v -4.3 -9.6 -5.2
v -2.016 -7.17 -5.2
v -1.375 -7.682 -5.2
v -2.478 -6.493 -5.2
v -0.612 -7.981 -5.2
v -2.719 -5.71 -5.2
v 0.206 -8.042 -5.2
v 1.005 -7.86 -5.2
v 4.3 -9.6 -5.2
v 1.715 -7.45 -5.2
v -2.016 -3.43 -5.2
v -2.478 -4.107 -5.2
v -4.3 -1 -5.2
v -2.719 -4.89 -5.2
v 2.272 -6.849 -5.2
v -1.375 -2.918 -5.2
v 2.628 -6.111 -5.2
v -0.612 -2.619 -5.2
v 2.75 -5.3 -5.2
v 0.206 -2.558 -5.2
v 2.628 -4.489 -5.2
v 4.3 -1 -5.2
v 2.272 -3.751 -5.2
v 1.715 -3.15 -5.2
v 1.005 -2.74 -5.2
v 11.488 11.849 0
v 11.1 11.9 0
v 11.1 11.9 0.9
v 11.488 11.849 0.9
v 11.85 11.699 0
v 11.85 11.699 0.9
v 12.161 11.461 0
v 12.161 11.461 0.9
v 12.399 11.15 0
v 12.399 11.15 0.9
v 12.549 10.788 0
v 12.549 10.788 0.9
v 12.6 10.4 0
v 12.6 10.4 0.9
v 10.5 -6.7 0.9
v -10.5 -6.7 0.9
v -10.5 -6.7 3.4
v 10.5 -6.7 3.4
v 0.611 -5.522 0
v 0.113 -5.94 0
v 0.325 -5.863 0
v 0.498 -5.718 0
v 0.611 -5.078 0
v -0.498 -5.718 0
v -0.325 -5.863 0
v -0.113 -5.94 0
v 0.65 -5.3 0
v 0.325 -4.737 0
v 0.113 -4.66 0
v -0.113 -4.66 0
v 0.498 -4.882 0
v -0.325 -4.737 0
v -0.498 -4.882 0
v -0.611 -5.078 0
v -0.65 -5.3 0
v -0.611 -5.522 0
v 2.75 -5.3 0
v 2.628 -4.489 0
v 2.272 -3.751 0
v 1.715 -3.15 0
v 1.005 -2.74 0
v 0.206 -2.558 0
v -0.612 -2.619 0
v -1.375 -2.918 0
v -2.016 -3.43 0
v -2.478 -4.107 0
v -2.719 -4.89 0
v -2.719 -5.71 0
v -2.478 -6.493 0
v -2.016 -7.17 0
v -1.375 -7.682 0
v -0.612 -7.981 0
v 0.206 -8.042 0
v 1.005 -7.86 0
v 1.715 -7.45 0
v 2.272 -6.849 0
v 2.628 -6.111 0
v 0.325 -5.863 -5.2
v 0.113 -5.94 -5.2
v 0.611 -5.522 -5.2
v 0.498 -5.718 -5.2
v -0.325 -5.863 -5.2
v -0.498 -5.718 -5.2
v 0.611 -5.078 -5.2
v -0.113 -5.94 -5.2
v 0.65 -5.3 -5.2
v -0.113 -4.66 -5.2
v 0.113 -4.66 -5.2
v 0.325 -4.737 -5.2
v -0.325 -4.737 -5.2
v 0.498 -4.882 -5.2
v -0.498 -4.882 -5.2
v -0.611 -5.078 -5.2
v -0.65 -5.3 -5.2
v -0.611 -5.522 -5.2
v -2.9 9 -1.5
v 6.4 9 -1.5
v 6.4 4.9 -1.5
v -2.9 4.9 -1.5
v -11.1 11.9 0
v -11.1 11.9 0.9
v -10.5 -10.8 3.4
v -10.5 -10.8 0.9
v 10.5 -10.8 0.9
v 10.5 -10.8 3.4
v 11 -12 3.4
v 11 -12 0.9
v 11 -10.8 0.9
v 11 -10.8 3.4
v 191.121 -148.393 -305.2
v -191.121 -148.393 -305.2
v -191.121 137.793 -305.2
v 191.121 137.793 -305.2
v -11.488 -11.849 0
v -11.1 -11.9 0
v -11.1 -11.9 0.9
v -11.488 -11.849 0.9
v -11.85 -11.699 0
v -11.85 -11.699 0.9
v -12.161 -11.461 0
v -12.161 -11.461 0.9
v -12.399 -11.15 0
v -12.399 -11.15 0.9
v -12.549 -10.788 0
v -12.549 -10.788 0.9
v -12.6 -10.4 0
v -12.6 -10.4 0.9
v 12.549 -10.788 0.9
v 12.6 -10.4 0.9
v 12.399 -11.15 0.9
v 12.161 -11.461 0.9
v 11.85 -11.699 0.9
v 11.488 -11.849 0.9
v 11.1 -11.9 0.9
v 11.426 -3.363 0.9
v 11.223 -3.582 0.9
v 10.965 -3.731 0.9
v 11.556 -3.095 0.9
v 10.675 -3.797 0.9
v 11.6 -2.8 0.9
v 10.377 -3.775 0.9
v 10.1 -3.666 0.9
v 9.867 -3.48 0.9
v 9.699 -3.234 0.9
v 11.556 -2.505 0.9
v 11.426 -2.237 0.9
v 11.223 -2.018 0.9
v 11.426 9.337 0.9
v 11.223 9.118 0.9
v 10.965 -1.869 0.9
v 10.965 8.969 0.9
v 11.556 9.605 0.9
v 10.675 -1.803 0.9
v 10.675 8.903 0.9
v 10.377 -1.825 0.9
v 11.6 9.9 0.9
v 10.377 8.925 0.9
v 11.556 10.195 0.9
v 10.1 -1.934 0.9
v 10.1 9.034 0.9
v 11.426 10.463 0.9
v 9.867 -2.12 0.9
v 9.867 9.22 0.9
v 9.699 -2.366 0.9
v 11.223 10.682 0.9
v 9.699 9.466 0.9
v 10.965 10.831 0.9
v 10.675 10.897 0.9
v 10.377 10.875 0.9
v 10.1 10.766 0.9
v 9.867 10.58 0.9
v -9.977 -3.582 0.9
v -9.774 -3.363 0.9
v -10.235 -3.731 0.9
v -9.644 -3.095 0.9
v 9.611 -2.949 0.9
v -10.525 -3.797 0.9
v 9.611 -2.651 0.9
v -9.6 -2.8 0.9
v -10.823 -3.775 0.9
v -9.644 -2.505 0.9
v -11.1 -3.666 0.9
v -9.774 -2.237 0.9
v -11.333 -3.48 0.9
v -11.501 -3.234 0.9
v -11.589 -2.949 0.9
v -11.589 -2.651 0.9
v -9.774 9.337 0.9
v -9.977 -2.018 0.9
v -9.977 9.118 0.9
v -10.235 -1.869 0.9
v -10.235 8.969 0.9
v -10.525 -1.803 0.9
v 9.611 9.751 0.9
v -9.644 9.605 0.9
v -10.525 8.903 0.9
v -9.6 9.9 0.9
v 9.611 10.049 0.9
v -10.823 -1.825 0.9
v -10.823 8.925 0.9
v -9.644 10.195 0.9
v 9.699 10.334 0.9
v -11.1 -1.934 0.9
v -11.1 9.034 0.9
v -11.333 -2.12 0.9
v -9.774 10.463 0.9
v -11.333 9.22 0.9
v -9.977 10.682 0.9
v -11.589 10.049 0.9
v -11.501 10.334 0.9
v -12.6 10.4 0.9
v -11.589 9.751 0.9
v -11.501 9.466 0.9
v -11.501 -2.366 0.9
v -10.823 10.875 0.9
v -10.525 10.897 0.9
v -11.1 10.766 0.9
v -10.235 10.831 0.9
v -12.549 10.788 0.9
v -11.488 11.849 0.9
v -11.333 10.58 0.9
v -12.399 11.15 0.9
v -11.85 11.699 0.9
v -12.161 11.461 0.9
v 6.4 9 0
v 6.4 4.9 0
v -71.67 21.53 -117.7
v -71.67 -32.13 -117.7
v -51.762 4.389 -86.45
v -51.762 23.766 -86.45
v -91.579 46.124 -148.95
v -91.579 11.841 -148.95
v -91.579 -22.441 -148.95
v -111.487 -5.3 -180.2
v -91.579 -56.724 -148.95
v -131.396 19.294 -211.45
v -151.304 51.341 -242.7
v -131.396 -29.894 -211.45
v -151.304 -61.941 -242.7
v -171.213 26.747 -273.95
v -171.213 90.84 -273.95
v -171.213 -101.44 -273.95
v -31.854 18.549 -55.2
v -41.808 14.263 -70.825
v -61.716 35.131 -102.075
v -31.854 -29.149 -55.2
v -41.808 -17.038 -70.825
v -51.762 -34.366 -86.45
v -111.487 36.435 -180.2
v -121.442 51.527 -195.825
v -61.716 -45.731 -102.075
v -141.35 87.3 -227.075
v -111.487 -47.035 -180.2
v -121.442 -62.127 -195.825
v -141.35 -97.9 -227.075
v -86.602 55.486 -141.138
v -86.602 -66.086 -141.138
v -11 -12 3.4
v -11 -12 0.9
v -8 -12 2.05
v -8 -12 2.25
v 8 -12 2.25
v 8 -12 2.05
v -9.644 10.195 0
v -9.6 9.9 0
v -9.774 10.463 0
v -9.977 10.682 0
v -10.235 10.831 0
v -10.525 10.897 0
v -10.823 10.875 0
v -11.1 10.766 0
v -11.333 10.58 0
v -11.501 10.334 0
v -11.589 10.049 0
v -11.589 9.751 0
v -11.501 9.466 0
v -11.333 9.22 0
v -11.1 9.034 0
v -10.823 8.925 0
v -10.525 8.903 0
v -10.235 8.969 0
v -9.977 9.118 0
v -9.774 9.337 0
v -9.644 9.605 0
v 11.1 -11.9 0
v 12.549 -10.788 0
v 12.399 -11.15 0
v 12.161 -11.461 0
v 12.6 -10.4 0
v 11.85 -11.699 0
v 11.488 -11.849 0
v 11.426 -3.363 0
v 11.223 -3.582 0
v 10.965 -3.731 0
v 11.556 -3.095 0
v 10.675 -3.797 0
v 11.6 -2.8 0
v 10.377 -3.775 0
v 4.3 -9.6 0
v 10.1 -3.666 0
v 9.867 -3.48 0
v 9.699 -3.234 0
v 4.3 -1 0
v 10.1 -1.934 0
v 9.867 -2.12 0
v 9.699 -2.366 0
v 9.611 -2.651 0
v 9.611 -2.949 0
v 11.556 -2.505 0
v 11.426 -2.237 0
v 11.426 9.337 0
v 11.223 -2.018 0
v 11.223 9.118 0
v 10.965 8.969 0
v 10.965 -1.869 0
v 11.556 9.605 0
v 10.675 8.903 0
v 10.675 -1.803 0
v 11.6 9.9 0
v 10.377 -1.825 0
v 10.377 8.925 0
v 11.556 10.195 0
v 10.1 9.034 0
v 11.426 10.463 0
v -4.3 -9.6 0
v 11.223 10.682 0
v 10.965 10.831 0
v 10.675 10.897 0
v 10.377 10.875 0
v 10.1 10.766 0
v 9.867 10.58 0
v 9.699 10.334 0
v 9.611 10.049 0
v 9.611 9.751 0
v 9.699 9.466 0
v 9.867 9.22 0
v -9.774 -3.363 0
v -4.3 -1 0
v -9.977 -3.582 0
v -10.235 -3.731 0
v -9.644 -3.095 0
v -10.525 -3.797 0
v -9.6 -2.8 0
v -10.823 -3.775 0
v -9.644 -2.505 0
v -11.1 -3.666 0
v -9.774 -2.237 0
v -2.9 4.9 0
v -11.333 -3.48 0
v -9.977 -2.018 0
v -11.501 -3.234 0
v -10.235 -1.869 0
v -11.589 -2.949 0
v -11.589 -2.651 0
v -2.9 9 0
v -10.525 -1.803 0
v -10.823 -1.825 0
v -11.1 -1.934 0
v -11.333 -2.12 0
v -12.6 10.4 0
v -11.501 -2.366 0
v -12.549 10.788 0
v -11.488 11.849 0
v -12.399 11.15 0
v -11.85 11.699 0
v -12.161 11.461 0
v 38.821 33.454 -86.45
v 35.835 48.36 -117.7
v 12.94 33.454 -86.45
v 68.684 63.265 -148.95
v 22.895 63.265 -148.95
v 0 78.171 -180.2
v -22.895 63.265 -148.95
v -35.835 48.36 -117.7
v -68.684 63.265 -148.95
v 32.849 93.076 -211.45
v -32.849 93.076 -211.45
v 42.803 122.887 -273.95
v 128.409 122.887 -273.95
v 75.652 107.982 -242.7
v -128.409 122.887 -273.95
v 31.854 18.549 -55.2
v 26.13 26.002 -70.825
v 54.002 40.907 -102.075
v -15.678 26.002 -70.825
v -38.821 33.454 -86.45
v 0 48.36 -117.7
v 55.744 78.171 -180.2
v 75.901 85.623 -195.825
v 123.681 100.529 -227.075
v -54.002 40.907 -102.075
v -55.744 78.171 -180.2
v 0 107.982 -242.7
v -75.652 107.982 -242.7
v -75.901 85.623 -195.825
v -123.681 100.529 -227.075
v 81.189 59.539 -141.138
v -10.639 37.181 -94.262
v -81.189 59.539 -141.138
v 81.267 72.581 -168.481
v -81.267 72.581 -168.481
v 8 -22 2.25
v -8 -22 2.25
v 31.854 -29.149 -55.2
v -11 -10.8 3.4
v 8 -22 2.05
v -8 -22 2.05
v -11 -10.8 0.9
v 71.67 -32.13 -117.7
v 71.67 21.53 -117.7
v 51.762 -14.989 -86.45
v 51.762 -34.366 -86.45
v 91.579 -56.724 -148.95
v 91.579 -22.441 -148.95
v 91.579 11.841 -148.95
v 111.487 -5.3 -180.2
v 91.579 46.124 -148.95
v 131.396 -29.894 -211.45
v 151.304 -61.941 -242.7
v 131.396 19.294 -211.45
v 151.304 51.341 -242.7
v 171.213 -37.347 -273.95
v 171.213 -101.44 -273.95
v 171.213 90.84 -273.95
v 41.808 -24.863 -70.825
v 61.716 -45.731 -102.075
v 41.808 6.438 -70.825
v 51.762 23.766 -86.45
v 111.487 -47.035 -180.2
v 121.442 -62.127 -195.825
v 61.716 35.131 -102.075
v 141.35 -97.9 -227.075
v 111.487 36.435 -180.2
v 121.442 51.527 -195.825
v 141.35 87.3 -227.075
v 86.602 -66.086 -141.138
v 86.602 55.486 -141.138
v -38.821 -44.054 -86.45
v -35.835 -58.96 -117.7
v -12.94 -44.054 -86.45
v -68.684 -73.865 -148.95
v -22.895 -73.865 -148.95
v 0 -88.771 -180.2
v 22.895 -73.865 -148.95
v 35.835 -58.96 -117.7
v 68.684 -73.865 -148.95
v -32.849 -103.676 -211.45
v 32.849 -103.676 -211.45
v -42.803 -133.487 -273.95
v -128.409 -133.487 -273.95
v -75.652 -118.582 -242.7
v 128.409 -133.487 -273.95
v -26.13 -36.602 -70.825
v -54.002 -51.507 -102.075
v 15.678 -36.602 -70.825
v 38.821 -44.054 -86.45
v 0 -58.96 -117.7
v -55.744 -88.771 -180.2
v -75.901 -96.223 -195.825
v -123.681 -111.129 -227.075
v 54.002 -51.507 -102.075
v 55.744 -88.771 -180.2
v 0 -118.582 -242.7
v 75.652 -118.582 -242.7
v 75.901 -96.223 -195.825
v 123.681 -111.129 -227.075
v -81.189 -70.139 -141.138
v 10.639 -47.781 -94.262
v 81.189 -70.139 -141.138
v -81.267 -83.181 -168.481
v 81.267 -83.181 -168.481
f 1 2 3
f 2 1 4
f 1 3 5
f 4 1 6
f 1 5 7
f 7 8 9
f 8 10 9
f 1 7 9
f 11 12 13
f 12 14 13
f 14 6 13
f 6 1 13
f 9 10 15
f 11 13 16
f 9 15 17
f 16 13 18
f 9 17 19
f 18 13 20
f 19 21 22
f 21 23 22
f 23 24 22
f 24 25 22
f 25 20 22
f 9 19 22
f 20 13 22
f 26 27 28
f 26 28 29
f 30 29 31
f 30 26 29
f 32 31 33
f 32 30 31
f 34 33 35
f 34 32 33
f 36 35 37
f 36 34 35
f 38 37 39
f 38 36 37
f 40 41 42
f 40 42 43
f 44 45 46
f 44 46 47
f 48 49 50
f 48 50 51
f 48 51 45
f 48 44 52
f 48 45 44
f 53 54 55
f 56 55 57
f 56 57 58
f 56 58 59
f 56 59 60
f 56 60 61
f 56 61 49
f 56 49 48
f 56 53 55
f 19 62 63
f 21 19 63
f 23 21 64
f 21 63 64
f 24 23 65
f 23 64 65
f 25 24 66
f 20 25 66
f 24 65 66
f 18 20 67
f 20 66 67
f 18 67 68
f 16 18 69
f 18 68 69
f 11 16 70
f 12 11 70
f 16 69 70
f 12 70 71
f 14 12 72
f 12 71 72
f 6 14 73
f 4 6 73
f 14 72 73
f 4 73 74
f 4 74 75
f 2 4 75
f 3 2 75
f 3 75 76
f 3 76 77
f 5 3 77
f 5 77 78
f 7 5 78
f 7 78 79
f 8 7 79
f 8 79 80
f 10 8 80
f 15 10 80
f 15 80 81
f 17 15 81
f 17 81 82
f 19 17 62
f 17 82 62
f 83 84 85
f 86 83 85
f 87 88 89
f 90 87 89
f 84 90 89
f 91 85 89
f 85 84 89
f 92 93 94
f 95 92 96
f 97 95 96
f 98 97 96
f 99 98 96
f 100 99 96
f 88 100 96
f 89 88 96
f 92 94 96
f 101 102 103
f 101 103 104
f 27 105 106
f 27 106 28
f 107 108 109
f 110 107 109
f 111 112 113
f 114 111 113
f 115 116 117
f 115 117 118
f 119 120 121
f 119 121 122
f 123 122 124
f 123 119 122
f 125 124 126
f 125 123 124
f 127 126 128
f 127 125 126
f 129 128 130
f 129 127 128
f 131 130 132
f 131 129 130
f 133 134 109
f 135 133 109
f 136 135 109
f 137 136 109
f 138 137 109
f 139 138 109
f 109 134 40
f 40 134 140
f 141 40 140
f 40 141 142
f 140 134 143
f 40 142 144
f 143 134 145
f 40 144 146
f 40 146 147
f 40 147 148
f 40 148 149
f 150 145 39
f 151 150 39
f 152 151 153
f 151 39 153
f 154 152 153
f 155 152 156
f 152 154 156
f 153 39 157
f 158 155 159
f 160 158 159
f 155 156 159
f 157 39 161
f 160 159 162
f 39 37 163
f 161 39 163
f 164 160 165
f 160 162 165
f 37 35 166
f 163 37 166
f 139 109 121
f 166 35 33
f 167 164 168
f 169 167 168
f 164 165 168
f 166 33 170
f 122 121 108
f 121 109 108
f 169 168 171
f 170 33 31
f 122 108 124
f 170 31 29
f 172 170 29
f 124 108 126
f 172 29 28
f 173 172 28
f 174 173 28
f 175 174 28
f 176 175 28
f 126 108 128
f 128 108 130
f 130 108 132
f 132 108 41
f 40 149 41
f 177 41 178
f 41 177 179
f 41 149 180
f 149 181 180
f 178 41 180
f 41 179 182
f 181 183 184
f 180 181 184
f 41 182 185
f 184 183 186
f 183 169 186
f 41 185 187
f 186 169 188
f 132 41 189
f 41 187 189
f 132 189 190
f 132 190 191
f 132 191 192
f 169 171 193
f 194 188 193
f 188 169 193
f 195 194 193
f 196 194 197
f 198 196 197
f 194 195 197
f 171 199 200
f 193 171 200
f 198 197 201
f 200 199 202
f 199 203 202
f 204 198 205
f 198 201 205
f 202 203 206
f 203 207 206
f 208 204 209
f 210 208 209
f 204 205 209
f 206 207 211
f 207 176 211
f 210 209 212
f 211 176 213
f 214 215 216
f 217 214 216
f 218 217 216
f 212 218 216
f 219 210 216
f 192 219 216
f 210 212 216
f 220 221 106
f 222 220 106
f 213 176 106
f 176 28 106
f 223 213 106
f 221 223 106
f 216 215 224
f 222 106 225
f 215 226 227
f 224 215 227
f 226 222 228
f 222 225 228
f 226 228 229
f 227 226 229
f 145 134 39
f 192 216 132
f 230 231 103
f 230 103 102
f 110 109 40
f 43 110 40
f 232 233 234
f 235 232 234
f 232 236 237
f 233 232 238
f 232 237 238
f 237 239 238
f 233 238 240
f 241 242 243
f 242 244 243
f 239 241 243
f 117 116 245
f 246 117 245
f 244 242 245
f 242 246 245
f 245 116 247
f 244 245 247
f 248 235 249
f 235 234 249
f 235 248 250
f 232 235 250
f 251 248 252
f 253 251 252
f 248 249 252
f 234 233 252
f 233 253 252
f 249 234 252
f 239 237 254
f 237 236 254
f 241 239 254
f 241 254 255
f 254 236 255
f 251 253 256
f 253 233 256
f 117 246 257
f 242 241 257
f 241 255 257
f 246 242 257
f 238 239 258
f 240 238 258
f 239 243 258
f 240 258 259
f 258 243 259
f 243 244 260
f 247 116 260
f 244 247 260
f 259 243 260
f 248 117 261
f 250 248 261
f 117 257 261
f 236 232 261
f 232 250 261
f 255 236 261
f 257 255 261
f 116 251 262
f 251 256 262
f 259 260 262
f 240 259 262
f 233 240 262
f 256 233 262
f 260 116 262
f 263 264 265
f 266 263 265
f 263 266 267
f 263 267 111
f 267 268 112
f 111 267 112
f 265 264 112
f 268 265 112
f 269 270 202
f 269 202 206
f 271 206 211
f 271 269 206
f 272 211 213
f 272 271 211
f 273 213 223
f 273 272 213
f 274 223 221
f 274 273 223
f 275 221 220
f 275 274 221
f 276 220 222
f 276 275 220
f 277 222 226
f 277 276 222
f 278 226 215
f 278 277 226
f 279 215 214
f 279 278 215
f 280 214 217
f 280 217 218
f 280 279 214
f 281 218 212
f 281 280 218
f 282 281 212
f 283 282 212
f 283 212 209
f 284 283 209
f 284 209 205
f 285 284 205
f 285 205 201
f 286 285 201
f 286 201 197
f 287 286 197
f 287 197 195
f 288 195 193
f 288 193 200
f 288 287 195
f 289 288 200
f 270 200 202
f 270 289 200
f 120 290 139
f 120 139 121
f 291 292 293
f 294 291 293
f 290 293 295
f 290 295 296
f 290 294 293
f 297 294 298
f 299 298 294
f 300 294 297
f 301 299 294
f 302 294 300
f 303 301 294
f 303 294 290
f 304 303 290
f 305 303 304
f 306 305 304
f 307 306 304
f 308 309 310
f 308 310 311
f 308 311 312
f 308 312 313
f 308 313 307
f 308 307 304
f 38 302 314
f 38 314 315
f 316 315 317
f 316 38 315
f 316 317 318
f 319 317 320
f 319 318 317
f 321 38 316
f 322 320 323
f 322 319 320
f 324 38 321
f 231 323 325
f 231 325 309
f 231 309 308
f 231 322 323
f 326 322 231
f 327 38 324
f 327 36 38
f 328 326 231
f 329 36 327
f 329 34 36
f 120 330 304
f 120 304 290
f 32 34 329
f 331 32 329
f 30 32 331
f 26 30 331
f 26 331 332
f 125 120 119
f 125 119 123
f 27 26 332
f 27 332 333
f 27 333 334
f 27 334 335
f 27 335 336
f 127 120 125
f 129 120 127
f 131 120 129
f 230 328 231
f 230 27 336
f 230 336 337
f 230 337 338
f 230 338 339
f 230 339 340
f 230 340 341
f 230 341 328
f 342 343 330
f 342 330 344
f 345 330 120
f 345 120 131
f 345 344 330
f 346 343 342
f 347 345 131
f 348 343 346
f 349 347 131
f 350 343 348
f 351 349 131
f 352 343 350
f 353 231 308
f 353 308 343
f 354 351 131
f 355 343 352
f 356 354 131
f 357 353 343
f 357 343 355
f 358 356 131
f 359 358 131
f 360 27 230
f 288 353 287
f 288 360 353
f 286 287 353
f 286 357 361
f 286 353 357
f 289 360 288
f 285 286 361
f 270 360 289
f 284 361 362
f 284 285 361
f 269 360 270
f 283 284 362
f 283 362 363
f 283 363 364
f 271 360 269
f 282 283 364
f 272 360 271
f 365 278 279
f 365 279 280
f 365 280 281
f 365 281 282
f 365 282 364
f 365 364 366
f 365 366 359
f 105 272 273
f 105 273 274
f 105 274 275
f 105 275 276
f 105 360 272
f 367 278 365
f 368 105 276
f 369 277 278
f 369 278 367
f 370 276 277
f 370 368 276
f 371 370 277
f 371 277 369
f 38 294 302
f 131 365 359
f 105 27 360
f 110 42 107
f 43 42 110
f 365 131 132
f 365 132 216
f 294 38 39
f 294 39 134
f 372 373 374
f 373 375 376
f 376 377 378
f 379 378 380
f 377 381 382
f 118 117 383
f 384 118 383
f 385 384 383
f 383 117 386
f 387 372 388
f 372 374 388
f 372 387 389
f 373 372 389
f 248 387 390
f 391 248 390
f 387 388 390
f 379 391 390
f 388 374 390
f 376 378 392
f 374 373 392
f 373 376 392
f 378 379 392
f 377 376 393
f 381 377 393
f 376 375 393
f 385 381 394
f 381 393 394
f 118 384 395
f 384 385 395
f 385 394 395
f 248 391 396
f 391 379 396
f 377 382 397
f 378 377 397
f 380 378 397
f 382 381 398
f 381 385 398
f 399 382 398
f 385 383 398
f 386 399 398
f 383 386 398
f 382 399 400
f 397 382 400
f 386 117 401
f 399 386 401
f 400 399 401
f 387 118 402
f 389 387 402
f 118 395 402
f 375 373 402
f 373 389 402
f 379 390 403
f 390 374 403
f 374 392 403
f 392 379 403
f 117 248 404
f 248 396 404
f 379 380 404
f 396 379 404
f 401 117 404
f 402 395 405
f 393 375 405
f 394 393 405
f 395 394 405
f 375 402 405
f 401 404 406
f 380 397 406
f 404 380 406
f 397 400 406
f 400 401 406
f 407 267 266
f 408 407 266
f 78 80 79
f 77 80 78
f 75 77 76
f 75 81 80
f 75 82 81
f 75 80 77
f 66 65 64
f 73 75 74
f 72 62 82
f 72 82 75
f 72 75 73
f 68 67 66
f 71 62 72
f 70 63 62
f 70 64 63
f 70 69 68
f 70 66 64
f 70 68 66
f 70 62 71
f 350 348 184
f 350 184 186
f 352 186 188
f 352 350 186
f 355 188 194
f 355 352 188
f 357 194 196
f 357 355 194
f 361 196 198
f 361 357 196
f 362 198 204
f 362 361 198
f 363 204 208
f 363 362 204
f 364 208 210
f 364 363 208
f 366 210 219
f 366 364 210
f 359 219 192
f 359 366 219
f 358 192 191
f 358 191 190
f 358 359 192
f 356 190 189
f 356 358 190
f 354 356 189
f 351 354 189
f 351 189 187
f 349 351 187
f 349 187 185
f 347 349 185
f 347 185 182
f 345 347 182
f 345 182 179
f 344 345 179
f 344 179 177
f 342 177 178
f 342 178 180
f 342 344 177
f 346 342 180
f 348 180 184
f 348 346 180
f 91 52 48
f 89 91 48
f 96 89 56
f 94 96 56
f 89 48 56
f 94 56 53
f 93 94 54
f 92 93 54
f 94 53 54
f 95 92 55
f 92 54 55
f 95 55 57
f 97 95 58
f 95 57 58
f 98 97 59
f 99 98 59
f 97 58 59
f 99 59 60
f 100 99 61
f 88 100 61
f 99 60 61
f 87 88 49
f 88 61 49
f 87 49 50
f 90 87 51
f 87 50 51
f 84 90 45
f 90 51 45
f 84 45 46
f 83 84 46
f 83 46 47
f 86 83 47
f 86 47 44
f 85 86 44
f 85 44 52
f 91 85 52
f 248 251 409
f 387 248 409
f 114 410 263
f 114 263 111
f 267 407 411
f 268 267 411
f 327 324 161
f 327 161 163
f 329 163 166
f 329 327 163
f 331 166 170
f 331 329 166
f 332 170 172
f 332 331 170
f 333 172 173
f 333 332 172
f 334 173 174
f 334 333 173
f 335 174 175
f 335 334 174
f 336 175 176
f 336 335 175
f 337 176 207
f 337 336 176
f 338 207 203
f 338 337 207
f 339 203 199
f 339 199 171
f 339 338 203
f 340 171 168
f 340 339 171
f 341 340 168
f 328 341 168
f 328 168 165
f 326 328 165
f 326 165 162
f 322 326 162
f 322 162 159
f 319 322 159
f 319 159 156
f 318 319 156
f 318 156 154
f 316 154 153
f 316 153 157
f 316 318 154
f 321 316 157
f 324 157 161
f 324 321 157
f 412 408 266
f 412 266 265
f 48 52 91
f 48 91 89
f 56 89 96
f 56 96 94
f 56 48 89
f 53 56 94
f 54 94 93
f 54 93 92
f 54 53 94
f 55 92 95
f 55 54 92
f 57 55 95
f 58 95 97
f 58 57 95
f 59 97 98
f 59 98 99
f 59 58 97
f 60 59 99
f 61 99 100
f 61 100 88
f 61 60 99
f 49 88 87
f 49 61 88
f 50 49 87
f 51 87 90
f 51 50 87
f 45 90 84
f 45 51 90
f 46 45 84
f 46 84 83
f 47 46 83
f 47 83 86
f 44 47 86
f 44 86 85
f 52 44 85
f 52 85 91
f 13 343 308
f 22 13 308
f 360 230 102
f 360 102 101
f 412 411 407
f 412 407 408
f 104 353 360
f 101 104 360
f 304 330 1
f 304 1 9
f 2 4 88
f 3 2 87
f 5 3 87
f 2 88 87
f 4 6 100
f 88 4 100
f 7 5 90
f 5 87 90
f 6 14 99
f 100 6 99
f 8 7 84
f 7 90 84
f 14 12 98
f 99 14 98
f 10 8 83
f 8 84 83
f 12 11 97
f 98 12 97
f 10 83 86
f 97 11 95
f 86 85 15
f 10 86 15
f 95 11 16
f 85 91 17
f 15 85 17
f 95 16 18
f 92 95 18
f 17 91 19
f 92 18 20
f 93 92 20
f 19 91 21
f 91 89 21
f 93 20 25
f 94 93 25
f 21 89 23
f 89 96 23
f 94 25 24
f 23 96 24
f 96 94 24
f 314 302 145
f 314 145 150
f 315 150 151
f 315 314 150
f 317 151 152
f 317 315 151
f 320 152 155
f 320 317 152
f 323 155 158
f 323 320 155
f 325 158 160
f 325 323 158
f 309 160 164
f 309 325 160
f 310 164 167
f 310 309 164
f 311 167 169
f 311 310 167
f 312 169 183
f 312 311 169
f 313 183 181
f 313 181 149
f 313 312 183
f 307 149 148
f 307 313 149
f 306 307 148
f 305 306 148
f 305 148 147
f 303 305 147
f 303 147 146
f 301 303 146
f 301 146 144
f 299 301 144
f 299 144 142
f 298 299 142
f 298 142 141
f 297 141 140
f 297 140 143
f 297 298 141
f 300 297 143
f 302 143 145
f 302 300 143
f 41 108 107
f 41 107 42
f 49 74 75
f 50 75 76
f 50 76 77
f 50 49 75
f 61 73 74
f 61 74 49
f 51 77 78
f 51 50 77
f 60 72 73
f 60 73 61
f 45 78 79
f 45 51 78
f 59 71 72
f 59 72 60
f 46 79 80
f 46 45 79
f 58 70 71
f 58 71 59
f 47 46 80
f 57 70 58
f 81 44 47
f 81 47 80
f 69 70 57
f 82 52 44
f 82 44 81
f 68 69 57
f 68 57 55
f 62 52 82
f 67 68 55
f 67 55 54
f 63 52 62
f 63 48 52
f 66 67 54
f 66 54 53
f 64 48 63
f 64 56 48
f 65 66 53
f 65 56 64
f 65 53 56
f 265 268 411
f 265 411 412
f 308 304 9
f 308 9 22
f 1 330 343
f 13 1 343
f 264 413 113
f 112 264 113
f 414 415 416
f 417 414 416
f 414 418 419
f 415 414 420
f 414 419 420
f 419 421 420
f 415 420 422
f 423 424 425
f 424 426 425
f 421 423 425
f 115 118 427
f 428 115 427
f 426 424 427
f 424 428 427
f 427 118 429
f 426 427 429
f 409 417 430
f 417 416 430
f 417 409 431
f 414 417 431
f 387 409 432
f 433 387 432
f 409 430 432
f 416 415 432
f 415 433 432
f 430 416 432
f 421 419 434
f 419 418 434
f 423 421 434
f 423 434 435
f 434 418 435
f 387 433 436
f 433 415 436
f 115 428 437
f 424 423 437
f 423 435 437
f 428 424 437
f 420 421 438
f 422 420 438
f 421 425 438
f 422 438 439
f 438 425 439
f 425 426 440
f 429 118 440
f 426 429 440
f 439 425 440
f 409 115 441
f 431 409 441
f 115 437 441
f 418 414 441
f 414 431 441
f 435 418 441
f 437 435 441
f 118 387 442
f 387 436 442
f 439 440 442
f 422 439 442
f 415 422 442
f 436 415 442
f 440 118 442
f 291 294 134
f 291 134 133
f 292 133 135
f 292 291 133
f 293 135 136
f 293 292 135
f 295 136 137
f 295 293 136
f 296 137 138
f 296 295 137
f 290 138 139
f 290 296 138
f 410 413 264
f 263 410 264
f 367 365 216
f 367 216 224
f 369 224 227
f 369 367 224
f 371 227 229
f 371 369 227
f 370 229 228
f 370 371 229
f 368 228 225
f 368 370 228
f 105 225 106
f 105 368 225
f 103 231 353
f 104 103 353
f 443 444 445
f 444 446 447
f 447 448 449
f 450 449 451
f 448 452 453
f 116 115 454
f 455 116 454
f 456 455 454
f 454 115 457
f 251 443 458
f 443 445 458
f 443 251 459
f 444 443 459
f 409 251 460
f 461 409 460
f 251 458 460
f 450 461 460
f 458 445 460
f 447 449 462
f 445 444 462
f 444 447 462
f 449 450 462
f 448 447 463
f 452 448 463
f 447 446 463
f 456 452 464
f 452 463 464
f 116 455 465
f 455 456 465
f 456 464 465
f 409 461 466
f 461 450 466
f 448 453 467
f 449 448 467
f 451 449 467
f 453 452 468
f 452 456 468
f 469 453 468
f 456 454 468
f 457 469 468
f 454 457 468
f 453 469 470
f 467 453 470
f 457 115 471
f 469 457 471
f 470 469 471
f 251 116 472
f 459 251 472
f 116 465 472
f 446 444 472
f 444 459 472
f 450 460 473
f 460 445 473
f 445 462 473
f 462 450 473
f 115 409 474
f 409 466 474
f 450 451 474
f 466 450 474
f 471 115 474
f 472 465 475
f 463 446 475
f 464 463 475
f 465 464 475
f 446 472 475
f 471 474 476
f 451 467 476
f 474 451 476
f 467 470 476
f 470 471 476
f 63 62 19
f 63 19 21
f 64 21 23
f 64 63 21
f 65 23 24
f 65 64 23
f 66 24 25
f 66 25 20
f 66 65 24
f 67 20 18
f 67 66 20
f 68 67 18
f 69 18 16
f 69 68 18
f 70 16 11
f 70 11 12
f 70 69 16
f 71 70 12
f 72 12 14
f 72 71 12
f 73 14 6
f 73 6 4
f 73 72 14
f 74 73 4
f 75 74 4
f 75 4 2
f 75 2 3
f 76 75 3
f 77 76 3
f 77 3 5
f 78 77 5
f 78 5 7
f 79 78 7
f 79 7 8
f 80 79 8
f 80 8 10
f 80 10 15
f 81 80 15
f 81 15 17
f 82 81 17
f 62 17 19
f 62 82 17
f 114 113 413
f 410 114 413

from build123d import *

# Parameters (mm, degrees)
SKETCH1_R           = 1
BOSS_EXTRUDE1_DEPTH = 0.9
SKETCH1_3_W         = 8.6
SKETCH1_3_H         = 8.6
SKETCH1_3_R         = 2.75
BOSS_EXTRUDE2_DEPTH = 5.2
SKETCH1_4_R         = 2.75
SKETCH1_4_R_2       = 0.65
BOSS_EXTRUDE3_DEPTH = 5.2
SKETCH1_5_R         = 0.65
BOSS_EXTRUDE4_DEPTH = 5.2
SKETCH3_W           = 21
SKETCH3_H           = 4.1
BOSS_EXTRUDE5_DEPTH = 2.5
BOSS_EXTRUDE6_DEPTH = 2.5
SKETCH4_W           = 16
SKETCH4_H           = 0.2
BOSS_EXTRUDE7_DEPTH = 10
SKETCH9_W           = 9.3
SKETCH9_H           = 4.1
BOSS_EXTRUDE8_DEPTH = 1.5


with BuildPart() as part:
    # Sketch1 → Boss-Extrude1 (new body)
    with BuildSketch(Plane.XY):
        with BuildLine():
            ThreePointArc((-12.6, -10.4), (-12.160660172, -11.460660172), (-11.1, -11.9))
            Line((-11.1, -11.9), (11.1, -11.9))
            ThreePointArc((11.1, -11.9), (12.160660172, -11.460660172), (12.6, -10.4))
            Line((12.6, -10.4), (12.6, 10.4))
            ThreePointArc((12.6, 10.4), (12.160660172, 11.460660172), (11.1, 11.9))
            Line((11.1, 11.9), (-11.1, 11.9))
            ThreePointArc((-11.1, 11.9), (-12.160660172, 11.460660172), (-12.6, 10.4))
            Line((-12.6, 10.4), (-12.6, -10.4))
        make_face()
        with Locations((-10.6, -2.8)):
            Circle(SKETCH1_R, mode=Mode.SUBTRACT)
        with Locations((10.6, -2.8)):
            Circle(SKETCH1_R, mode=Mode.SUBTRACT)
        with Locations((-10.6, 9.9)):
            Circle(SKETCH1_R, mode=Mode.SUBTRACT)
        with Locations((10.6, 9.9)):
            Circle(SKETCH1_R, mode=Mode.SUBTRACT)
    extrude(amount=BOSS_EXTRUDE1_DEPTH)

    # Sketch1<3> → Boss-Extrude2 (add)
    with BuildSketch(Plane.XY):
        with Locations((0, -5.3)):
            Rectangle(SKETCH1_3_W, SKETCH1_3_H)
        with Locations((0, -5.3)):
            Circle(SKETCH1_3_R, mode=Mode.SUBTRACT)
    extrude(amount=-BOSS_EXTRUDE2_DEPTH)

    # Sketch3 → Boss-Extrude5 (add)
    with BuildSketch(Plane.XY.offset(0.9)):
        with Locations((0, -8.75)):
            Rectangle(SKETCH3_W, SKETCH3_H)
    extrude(amount=BOSS_EXTRUDE5_DEPTH)

    # Sketch9 → Boss-Extrude8 (add)
    with BuildSketch(Plane(origin=(0, 0, 0), x_dir=(-1, 0, 0), z_dir=(0, 0, -1))):
        with Locations((-1.75, 6.95)):
            Rectangle(SKETCH9_W, SKETCH9_H)
    extrude(amount=BOSS_EXTRUDE8_DEPTH)


with BuildPart() as body_2:
    # Sketch1<4> → Boss-Extrude3 (new body)
    with BuildSketch(Plane.XY):
        with Locations((0, -5.3)):
            Circle(SKETCH1_4_R)
        with Locations((0, -5.3)):
            Circle(SKETCH1_4_R_2, mode=Mode.SUBTRACT)
    extrude(amount=-BOSS_EXTRUDE3_DEPTH)


with BuildPart() as body_3:
    # Sketch1<5> → Boss-Extrude4 (new body)
    with BuildSketch(Plane.XY):
        with Locations((0, -5.3)):
            Circle(SKETCH1_5_R)
    extrude(amount=-BOSS_EXTRUDE4_DEPTH)


with BuildPart() as body_4:
    # Sketch3<3> → Boss-Extrude6 (new body)
    with BuildSketch(Plane.XY.offset(0.9)):
        Polygon((10.5, -10.8), (-10.5, -10.8), (-11, -10.8), (-11, -12), (11, -12), (11, -10.8), align=None)
    extrude(amount=BOSS_EXTRUDE6_DEPTH)

    # Sketch4 → Boss-Extrude7 (add)
    with BuildSketch(Plane(origin=(0, -12, 0), x_dir=(-1, 0, 0), z_dir=(0, -1, 0))):
        with Locations((0, -2.15)):
            Rectangle(SKETCH4_W, SKETCH4_H)
    extrude(amount=BOSS_EXTRUDE7_DEPTH)


with BuildPart() as body_5:
    # Sketch7 → Camera FoV section 0
    with BuildSketch(Plane.XY.offset(-55.2)):
        with BuildLine():
            Line((-31.85351304, -29.148776635), (31.85351304, -29.148776635))
            Line((31.85351304, -29.148776635), (31.85351304, 18.548776635))
            Line((31.85351304, 18.548776635), (-31.85351304, 18.548776635))
            Line((-31.85351304, 18.548776635), (-31.85351304, -29.148776635))
        make_face()
    # Sketch8 → Camera FoV section 1
    with BuildSketch(Plane.XY.offset(-305.2)):
        with BuildLine():
            Line((-191.121078242, -148.392659809), (191.121078242, -148.392659809))
            Line((191.121078242, -148.392659809), (191.121078242, 137.792659809))
            Line((191.121078242, 137.792659809), (-191.121078242, 137.792659809))
            Line((-191.121078242, 137.792659809), (-191.121078242, -148.392659809))
        make_face()
    loft()


solid = Compound([part.part, body_2.part, body_3.part, body_4.part, body_5.part])
